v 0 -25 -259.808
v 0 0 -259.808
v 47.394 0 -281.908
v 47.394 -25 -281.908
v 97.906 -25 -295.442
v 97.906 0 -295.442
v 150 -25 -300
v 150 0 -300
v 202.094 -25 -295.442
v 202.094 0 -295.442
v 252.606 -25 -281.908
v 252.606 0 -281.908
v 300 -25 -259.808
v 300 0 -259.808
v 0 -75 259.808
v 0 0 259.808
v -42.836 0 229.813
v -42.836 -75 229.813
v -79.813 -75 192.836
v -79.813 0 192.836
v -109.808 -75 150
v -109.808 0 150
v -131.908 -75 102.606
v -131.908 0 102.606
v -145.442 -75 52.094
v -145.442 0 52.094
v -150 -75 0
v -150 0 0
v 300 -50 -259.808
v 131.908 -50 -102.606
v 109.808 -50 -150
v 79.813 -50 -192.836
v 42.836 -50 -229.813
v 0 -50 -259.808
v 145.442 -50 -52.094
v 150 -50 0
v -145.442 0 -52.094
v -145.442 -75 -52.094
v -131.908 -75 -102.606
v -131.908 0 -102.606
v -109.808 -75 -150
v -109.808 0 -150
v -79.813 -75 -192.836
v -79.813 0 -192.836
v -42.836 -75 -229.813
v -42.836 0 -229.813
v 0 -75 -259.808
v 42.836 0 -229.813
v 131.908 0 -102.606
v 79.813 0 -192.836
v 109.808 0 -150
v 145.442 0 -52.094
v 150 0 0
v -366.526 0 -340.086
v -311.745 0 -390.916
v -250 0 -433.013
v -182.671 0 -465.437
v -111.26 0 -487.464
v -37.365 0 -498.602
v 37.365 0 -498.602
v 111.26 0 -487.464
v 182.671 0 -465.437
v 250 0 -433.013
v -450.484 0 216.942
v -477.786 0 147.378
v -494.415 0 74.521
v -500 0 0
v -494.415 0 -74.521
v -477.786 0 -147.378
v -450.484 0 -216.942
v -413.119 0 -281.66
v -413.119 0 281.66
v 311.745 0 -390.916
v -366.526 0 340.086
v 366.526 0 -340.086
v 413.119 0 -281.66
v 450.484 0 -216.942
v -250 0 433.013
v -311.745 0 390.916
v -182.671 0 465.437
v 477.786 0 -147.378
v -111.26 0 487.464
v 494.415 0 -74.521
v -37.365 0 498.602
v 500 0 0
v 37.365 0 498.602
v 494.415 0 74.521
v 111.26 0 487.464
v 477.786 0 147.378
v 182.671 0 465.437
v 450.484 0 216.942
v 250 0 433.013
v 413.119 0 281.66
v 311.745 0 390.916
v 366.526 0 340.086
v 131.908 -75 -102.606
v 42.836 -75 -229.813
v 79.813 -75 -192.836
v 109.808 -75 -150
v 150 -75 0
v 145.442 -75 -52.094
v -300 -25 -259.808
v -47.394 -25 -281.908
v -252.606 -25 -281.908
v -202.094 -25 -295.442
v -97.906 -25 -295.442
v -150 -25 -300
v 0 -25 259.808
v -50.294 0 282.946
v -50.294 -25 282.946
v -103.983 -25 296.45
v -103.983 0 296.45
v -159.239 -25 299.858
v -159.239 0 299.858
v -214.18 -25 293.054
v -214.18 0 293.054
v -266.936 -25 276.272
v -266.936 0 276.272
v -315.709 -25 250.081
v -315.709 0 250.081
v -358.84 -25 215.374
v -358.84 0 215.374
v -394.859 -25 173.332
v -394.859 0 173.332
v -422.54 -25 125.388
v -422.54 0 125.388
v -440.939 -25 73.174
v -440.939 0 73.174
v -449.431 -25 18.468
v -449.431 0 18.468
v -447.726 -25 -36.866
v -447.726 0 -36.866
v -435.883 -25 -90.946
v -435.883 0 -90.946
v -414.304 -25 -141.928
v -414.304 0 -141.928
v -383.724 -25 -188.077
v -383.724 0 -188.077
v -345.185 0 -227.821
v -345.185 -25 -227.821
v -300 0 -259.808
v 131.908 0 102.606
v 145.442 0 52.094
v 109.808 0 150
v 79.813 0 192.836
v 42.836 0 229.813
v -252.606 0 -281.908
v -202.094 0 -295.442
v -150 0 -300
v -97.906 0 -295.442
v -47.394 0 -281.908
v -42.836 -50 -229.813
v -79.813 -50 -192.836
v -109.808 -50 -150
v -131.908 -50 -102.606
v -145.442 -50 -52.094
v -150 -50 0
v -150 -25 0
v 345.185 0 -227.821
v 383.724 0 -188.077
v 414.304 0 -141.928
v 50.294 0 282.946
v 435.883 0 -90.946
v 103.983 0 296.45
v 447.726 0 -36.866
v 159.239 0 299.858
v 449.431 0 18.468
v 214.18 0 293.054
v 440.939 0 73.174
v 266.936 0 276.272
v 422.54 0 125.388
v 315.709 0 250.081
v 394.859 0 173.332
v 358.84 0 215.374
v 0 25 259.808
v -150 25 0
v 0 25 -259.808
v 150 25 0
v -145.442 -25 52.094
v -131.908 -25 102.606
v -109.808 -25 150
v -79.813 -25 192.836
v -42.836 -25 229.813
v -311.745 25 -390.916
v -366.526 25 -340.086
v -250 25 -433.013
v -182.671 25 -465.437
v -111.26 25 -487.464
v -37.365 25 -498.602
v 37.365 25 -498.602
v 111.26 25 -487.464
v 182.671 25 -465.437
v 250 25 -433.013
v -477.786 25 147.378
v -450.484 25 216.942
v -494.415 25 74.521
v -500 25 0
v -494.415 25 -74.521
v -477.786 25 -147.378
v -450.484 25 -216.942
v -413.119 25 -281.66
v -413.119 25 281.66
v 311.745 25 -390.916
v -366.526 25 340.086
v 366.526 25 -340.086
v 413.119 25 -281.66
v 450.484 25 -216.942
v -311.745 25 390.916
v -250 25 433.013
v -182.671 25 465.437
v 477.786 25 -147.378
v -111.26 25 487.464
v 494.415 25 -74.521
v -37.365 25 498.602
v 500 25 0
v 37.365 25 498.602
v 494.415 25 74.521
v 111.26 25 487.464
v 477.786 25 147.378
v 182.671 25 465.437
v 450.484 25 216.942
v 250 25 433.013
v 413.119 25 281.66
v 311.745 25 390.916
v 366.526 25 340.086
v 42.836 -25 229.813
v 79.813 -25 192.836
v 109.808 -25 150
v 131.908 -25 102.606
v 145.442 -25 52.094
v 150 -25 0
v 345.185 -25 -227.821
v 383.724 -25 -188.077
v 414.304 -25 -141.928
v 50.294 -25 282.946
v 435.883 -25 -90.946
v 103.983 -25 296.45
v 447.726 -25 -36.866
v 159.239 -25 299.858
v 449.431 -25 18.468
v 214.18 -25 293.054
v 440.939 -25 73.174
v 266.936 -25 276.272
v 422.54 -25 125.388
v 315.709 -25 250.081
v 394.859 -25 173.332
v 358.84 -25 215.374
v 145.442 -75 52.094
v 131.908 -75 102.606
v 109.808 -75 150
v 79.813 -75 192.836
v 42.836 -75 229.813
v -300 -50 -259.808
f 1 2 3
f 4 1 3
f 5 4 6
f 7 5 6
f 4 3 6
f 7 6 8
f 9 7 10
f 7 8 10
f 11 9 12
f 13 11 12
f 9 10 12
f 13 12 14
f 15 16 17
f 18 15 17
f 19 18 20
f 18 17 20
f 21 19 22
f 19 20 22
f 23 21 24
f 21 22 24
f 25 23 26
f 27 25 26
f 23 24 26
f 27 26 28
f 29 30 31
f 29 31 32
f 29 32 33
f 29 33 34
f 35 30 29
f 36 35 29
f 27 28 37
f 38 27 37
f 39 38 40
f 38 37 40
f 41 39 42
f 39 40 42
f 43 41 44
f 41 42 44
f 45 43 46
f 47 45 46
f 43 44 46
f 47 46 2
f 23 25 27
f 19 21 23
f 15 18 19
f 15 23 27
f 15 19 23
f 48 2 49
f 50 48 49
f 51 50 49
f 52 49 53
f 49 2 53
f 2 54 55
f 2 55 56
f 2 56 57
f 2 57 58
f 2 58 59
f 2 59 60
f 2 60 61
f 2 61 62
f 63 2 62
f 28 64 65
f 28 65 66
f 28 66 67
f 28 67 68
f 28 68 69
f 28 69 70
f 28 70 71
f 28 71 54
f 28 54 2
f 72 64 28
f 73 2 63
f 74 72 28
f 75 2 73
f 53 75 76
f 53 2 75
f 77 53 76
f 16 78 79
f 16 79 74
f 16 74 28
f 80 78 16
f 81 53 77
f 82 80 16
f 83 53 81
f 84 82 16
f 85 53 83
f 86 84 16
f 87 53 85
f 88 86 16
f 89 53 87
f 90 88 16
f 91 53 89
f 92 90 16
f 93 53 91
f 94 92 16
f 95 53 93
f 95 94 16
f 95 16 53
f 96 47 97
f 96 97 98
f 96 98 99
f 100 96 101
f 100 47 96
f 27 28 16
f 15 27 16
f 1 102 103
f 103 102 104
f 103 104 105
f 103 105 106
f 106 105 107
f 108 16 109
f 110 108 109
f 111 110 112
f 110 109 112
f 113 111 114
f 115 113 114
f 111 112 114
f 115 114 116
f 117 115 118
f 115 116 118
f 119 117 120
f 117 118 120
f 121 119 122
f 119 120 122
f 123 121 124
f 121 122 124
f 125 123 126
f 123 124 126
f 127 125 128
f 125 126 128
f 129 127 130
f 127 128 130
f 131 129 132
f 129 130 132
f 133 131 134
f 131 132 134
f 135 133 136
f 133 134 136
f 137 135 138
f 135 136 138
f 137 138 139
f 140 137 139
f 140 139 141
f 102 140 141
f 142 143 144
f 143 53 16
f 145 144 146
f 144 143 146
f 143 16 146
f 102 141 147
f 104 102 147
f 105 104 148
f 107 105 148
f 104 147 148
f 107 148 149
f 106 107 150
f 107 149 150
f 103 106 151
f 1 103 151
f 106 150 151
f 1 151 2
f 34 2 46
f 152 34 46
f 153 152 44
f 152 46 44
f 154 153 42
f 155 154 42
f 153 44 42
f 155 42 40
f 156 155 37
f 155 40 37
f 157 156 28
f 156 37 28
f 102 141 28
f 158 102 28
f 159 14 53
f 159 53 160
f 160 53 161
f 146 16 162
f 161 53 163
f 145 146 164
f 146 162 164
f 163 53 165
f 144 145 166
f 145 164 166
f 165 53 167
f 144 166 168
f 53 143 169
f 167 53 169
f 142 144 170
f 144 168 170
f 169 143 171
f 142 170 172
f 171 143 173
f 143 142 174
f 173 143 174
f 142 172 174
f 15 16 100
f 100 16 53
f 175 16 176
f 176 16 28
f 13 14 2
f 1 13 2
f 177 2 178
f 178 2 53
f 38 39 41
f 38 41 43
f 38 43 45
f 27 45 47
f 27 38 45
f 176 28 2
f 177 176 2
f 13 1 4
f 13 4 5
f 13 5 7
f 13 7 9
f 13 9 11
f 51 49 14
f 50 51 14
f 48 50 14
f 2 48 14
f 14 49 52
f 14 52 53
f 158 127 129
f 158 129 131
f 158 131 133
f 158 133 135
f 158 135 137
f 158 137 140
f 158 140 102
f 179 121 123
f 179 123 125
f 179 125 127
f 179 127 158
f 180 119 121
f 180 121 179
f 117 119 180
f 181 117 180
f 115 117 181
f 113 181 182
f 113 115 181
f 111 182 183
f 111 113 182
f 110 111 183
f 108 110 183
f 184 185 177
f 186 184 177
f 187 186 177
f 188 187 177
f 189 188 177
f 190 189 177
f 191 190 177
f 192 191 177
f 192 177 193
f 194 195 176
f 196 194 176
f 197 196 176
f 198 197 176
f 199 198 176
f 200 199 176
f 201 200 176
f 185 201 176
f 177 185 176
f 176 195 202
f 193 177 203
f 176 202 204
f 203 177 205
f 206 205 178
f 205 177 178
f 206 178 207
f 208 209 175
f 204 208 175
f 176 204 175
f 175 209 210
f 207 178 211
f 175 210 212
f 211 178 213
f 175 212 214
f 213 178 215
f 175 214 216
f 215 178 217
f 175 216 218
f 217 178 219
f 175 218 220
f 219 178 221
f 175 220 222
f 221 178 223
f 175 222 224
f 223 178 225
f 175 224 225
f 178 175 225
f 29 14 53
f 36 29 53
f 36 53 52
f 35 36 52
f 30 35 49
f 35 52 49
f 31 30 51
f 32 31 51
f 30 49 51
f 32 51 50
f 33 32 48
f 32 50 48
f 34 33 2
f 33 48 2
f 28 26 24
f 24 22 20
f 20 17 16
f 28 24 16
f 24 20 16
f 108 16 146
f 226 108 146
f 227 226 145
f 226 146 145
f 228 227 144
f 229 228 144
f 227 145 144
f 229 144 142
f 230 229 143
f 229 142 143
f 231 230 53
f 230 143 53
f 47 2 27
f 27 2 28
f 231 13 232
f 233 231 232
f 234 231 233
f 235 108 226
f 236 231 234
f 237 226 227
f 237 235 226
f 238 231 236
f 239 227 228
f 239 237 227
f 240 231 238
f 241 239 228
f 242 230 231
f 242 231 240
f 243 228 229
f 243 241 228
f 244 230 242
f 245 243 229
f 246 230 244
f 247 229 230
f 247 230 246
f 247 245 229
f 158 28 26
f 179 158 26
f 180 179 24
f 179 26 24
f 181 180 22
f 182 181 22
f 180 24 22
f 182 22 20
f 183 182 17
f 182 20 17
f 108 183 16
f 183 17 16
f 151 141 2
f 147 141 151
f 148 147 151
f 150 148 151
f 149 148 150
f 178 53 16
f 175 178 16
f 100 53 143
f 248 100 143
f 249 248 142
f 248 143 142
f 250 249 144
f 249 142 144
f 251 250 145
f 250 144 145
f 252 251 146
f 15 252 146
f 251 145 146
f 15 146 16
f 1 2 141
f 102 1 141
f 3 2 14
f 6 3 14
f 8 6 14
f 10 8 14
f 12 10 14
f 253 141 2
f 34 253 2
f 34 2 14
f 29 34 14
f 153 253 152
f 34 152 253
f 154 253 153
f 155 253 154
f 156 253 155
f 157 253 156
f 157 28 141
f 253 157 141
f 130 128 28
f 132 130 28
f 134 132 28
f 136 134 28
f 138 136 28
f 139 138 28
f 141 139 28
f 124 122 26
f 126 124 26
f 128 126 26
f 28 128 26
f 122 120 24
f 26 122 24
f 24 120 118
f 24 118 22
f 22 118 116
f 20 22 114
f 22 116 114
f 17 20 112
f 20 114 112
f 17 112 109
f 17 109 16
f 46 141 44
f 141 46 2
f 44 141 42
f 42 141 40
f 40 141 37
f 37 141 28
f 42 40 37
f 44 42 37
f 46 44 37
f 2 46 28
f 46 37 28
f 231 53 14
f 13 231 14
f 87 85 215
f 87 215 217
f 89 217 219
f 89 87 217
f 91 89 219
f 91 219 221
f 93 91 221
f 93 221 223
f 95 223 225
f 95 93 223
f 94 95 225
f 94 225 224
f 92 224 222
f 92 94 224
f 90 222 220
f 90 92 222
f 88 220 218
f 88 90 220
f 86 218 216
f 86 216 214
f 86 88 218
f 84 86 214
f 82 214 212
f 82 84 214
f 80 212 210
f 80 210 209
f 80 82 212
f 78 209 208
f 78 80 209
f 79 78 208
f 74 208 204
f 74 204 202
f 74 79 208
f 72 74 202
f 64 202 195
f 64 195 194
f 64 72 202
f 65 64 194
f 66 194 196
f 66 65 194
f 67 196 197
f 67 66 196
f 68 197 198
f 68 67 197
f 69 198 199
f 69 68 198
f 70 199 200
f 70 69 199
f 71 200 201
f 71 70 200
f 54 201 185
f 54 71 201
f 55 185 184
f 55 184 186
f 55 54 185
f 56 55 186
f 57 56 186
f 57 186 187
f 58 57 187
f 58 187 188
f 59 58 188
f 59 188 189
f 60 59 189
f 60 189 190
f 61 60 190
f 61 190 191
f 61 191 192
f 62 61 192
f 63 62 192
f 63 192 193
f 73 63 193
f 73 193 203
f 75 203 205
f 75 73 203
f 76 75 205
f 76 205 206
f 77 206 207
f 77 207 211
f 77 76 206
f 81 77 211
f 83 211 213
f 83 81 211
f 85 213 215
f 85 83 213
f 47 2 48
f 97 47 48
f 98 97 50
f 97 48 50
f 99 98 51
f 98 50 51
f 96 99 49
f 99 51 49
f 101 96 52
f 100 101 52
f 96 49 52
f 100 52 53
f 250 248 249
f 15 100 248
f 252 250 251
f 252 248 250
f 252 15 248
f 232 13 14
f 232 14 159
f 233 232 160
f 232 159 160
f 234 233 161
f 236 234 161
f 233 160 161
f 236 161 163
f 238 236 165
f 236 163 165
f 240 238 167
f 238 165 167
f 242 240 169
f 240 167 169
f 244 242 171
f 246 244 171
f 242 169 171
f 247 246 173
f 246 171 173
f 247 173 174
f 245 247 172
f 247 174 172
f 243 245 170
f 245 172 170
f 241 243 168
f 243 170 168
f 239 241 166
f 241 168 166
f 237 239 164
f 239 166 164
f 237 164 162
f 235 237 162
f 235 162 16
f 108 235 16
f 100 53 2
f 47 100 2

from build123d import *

# Parameters (mm, degrees)
F0_R     = 500
F2_DEPTH = 25
F3_DEPTH = 25
F4_DEPTH = 50
F5_DEPTH = 75
F6_DEPTH = 300


with BuildPart() as f2:
    # F0 (on Front) → F2 (new body)
    with BuildSketch(Plane.XZ):
        Circle(F0_R)
    extrude(amount=-F2_DEPTH)

    # F1 (on Front) → F6 (cut)
    with BuildSketch(Plane.XZ):
        Polygon((0, 0), (0, 259.8076211353), (-150, 0), align=None)
        Polygon((0, 0), (150, 0), (0, 259.8076211353), align=None)
        Polygon((0, -259.8076211353), (150, 0), (0, 0), align=None)
        Polygon((-150, 0), (0, -259.8076211353), (0, 0), align=None)
    extrude(amount=-F6_DEPTH, mode=Mode.SUBTRACT)


with BuildPart() as f3:
    # F1 (on Front) → F3 (new body)
    with BuildSketch(Plane.XZ):
        with BuildLine():
            ThreePointArc((0, 259.8076211353), (109.8076211353, 150), (150, 0))
            Line((150, 0), (300, -259.8076211353))
            ThreePointArc((300, -259.8076211353), (409.8076211353, -150), (450, 0))
            ThreePointArc((450, 0), (300, 259.8076211353), (0, 259.8076211353))
        make_face()
    extrude(amount=F3_DEPTH)


with BuildPart() as f3b:
    # F1 (on Front) → F3, piece 2 (new body)
    with BuildSketch(Plane.XZ):
        with BuildLine():
            ThreePointArc((-150, 0), (-109.8076211353, 150), (0, 259.8076211353))
            ThreePointArc((0, 259.8076211353), (-409.8076211353, 150), (-300, -259.8076211353))
            Line((-300, -259.8076211353), (-150, 0))
        make_face()
    extrude(amount=F3_DEPTH)


with BuildPart() as f3c:
    # F1 (on Front) → F3, piece 3 (new body)
    with BuildSketch(Plane.XZ):
        with BuildLine():
            Line((300, -259.8076211353), (0, -259.8076211353))
            ThreePointArc((0, -259.8076211353), (150, -300), (300, -259.8076211353))
        make_face()
    extrude(amount=F3_DEPTH)


with BuildPart() as f3d:
    # F1 (on Front) → F3, piece 4 (new body)
    with BuildSketch(Plane.XZ):
        with BuildLine():
            ThreePointArc((-300, -259.8076211353), (-150, -300), (0, -259.8076211353))
            Line((0, -259.8076211353), (-300, -259.8076211353))
        make_face()
    extrude(amount=F3_DEPTH)


with BuildPart() as f4:
    # F1 (on Front) → F4 (new body)
    with BuildSketch(Plane.XZ):
        with BuildLine():
            Line((300, -259.8076211353), (150, 0))
            ThreePointArc((150, 0), (109.8076211353, -150), (0, -259.8076211353))
            Line((0, -259.8076211353), (300, -259.8076211353))
        make_face()
    extrude(amount=F4_DEPTH)


with BuildPart() as f4b:
    # F1 (on Front) → F4, piece 2 (new body)
    with BuildSketch(Plane.XZ):
        with BuildLine():
            Line((-150, 0), (0, 259.8076211353))
            ThreePointArc((0, 259.8076211353), (-109.8076211353, 150), (-150, 0))
        make_face()
    extrude(amount=F4_DEPTH)

    # F1 (on Front) → F5, piece 3 (join)
    with BuildSketch(Plane.XZ):
        with BuildLine():
            Line((-150, 0), (0, 259.8076211353))
            ThreePointArc((0, 259.8076211353), (-109.8076211353, 150), (-150, 0))
        make_face()
    extrude(amount=F5_DEPTH)


with BuildPart() as f4c:
    # F1 (on Front) → F4, piece 3 (new body)
    with BuildSketch(Plane.XZ):
        with BuildLine():
            Line((-300, -259.8076211353), (0, -259.8076211353))
            ThreePointArc((0, -259.8076211353), (-109.8076211353, -150), (-150, 0))
            Line((-150, 0), (-300, -259.8076211353))
        make_face()
    extrude(amount=F4_DEPTH)


with BuildPart() as f5:
    # F1 (on Front) → F5 (new body)
    with BuildSketch(Plane.XZ):
        with BuildLine():
            Line((0, 259.8076211353), (150, 0))
            ThreePointArc((150, 0), (109.8076211353, 150), (0, 259.8076211353))
        make_face()
    extrude(amount=F5_DEPTH)


with BuildPart() as f5b:
    # F1 (on Front) → F5, piece 2 (new body)
    with BuildSketch(Plane.XZ):
        with BuildLine():
            ThreePointArc((0, -259.8076211353), (109.8076211353, -150), (150, 0))
            Line((150, 0), (0, -259.8076211353))
        make_face()
    extrude(amount=F5_DEPTH)


with BuildPart() as f5c:
    # F1 (on Front) → F5, piece 4 (new body)
    with BuildSketch(Plane.XZ):
        with BuildLine():
            ThreePointArc((-150, 0), (-109.8076211353, -150), (0, -259.8076211353))
            Line((0, -259.8076211353), (-150, 0))
        make_face()
    extrude(amount=F5_DEPTH)


solid = Compound([f2.part, f3.part, f3b.part, f3c.part, f3d.part, f4.part, f4b.part, f4c.part, f5.part, f5b.part, f5c.part])
